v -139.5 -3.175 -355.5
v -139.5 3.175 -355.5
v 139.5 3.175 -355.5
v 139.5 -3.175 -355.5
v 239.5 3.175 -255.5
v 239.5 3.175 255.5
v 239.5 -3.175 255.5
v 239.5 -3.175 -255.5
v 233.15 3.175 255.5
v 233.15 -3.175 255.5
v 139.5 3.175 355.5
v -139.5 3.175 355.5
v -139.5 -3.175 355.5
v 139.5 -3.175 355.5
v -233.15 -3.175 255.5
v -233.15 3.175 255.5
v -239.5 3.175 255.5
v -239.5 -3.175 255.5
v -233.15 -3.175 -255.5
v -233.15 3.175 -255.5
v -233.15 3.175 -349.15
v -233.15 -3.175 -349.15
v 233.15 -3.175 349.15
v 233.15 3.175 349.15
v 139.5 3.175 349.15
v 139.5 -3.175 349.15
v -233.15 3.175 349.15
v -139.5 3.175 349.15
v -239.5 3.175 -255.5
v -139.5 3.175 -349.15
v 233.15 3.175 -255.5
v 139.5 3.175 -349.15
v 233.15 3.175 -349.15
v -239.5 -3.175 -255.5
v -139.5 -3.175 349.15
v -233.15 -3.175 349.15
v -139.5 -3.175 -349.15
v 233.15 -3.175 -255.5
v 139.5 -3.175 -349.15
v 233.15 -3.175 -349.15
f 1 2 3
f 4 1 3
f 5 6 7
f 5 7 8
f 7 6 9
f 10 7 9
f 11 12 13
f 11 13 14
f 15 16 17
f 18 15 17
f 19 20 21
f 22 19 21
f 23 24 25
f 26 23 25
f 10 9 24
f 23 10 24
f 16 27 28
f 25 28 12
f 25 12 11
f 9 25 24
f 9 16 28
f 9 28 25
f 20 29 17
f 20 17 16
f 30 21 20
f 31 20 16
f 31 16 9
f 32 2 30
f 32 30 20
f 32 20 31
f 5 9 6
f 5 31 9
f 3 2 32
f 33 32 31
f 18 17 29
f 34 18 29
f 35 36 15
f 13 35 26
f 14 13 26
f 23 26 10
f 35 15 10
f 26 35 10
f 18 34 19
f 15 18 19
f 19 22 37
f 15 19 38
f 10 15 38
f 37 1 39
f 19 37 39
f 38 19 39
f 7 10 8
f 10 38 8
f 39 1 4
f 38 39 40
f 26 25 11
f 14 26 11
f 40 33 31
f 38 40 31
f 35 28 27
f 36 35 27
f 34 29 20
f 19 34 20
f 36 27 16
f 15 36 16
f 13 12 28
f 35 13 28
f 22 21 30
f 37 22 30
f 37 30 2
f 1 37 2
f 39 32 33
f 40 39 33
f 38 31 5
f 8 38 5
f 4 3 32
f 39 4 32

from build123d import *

# Parameters (mm, degrees)
SKETCH1_W           = 479
SKETCH1_H           = 711
BOSS_EXTRUDE1_DEPTH = 3.175
CUT_EXTRUDE1_DEPTH  = 429.696655574


with BuildPart() as part:
    # Sketch1 → Boss-Extrude1 (new, symmetric)
    with BuildSketch(Plane(origin=(0, 0, 0), x_dir=(1, 0, 0), z_dir=(0, 1, 0))):
        Rectangle(SKETCH1_W, SKETCH1_H)
    extrude(amount=BOSS_EXTRUDE1_DEPTH, both=True)

    # Sketch2 → Cut-Extrude1 (cut, through all)
    with BuildSketch(Plane(origin=(0, 3.175, 0), x_dir=(1, 0, 0), z_dir=(0, 1, 0))):
        Polygon((-239.5, 355.5), (-239.5, 255.5), (-233.15, 255.5), (-233.15, 349.15), (-139.5, 349.15), (-139.5, 355.5), align=None)
        Polygon((239.5, 355.5), (139.5, 355.5), (139.5, 349.15), (233.15, 349.15), (233.15, 255.5), (239.5, 255.5), align=None)
        Polygon((239.5, -355.5), (239.5, -255.5), (233.15, -255.5), (233.15, -349.15), (139.5, -349.15), (139.5, -355.5), align=None)
        Polygon((-239.5, -355.5), (-139.5, -355.5), (-139.5, -349.15), (-233.15, -349.15), (-233.15, -255.5), (-239.5, -255.5), align=None)
    extrude(amount=-CUT_EXTRUDE1_DEPTH, mode=Mode.SUBTRACT)


solid = part.part
